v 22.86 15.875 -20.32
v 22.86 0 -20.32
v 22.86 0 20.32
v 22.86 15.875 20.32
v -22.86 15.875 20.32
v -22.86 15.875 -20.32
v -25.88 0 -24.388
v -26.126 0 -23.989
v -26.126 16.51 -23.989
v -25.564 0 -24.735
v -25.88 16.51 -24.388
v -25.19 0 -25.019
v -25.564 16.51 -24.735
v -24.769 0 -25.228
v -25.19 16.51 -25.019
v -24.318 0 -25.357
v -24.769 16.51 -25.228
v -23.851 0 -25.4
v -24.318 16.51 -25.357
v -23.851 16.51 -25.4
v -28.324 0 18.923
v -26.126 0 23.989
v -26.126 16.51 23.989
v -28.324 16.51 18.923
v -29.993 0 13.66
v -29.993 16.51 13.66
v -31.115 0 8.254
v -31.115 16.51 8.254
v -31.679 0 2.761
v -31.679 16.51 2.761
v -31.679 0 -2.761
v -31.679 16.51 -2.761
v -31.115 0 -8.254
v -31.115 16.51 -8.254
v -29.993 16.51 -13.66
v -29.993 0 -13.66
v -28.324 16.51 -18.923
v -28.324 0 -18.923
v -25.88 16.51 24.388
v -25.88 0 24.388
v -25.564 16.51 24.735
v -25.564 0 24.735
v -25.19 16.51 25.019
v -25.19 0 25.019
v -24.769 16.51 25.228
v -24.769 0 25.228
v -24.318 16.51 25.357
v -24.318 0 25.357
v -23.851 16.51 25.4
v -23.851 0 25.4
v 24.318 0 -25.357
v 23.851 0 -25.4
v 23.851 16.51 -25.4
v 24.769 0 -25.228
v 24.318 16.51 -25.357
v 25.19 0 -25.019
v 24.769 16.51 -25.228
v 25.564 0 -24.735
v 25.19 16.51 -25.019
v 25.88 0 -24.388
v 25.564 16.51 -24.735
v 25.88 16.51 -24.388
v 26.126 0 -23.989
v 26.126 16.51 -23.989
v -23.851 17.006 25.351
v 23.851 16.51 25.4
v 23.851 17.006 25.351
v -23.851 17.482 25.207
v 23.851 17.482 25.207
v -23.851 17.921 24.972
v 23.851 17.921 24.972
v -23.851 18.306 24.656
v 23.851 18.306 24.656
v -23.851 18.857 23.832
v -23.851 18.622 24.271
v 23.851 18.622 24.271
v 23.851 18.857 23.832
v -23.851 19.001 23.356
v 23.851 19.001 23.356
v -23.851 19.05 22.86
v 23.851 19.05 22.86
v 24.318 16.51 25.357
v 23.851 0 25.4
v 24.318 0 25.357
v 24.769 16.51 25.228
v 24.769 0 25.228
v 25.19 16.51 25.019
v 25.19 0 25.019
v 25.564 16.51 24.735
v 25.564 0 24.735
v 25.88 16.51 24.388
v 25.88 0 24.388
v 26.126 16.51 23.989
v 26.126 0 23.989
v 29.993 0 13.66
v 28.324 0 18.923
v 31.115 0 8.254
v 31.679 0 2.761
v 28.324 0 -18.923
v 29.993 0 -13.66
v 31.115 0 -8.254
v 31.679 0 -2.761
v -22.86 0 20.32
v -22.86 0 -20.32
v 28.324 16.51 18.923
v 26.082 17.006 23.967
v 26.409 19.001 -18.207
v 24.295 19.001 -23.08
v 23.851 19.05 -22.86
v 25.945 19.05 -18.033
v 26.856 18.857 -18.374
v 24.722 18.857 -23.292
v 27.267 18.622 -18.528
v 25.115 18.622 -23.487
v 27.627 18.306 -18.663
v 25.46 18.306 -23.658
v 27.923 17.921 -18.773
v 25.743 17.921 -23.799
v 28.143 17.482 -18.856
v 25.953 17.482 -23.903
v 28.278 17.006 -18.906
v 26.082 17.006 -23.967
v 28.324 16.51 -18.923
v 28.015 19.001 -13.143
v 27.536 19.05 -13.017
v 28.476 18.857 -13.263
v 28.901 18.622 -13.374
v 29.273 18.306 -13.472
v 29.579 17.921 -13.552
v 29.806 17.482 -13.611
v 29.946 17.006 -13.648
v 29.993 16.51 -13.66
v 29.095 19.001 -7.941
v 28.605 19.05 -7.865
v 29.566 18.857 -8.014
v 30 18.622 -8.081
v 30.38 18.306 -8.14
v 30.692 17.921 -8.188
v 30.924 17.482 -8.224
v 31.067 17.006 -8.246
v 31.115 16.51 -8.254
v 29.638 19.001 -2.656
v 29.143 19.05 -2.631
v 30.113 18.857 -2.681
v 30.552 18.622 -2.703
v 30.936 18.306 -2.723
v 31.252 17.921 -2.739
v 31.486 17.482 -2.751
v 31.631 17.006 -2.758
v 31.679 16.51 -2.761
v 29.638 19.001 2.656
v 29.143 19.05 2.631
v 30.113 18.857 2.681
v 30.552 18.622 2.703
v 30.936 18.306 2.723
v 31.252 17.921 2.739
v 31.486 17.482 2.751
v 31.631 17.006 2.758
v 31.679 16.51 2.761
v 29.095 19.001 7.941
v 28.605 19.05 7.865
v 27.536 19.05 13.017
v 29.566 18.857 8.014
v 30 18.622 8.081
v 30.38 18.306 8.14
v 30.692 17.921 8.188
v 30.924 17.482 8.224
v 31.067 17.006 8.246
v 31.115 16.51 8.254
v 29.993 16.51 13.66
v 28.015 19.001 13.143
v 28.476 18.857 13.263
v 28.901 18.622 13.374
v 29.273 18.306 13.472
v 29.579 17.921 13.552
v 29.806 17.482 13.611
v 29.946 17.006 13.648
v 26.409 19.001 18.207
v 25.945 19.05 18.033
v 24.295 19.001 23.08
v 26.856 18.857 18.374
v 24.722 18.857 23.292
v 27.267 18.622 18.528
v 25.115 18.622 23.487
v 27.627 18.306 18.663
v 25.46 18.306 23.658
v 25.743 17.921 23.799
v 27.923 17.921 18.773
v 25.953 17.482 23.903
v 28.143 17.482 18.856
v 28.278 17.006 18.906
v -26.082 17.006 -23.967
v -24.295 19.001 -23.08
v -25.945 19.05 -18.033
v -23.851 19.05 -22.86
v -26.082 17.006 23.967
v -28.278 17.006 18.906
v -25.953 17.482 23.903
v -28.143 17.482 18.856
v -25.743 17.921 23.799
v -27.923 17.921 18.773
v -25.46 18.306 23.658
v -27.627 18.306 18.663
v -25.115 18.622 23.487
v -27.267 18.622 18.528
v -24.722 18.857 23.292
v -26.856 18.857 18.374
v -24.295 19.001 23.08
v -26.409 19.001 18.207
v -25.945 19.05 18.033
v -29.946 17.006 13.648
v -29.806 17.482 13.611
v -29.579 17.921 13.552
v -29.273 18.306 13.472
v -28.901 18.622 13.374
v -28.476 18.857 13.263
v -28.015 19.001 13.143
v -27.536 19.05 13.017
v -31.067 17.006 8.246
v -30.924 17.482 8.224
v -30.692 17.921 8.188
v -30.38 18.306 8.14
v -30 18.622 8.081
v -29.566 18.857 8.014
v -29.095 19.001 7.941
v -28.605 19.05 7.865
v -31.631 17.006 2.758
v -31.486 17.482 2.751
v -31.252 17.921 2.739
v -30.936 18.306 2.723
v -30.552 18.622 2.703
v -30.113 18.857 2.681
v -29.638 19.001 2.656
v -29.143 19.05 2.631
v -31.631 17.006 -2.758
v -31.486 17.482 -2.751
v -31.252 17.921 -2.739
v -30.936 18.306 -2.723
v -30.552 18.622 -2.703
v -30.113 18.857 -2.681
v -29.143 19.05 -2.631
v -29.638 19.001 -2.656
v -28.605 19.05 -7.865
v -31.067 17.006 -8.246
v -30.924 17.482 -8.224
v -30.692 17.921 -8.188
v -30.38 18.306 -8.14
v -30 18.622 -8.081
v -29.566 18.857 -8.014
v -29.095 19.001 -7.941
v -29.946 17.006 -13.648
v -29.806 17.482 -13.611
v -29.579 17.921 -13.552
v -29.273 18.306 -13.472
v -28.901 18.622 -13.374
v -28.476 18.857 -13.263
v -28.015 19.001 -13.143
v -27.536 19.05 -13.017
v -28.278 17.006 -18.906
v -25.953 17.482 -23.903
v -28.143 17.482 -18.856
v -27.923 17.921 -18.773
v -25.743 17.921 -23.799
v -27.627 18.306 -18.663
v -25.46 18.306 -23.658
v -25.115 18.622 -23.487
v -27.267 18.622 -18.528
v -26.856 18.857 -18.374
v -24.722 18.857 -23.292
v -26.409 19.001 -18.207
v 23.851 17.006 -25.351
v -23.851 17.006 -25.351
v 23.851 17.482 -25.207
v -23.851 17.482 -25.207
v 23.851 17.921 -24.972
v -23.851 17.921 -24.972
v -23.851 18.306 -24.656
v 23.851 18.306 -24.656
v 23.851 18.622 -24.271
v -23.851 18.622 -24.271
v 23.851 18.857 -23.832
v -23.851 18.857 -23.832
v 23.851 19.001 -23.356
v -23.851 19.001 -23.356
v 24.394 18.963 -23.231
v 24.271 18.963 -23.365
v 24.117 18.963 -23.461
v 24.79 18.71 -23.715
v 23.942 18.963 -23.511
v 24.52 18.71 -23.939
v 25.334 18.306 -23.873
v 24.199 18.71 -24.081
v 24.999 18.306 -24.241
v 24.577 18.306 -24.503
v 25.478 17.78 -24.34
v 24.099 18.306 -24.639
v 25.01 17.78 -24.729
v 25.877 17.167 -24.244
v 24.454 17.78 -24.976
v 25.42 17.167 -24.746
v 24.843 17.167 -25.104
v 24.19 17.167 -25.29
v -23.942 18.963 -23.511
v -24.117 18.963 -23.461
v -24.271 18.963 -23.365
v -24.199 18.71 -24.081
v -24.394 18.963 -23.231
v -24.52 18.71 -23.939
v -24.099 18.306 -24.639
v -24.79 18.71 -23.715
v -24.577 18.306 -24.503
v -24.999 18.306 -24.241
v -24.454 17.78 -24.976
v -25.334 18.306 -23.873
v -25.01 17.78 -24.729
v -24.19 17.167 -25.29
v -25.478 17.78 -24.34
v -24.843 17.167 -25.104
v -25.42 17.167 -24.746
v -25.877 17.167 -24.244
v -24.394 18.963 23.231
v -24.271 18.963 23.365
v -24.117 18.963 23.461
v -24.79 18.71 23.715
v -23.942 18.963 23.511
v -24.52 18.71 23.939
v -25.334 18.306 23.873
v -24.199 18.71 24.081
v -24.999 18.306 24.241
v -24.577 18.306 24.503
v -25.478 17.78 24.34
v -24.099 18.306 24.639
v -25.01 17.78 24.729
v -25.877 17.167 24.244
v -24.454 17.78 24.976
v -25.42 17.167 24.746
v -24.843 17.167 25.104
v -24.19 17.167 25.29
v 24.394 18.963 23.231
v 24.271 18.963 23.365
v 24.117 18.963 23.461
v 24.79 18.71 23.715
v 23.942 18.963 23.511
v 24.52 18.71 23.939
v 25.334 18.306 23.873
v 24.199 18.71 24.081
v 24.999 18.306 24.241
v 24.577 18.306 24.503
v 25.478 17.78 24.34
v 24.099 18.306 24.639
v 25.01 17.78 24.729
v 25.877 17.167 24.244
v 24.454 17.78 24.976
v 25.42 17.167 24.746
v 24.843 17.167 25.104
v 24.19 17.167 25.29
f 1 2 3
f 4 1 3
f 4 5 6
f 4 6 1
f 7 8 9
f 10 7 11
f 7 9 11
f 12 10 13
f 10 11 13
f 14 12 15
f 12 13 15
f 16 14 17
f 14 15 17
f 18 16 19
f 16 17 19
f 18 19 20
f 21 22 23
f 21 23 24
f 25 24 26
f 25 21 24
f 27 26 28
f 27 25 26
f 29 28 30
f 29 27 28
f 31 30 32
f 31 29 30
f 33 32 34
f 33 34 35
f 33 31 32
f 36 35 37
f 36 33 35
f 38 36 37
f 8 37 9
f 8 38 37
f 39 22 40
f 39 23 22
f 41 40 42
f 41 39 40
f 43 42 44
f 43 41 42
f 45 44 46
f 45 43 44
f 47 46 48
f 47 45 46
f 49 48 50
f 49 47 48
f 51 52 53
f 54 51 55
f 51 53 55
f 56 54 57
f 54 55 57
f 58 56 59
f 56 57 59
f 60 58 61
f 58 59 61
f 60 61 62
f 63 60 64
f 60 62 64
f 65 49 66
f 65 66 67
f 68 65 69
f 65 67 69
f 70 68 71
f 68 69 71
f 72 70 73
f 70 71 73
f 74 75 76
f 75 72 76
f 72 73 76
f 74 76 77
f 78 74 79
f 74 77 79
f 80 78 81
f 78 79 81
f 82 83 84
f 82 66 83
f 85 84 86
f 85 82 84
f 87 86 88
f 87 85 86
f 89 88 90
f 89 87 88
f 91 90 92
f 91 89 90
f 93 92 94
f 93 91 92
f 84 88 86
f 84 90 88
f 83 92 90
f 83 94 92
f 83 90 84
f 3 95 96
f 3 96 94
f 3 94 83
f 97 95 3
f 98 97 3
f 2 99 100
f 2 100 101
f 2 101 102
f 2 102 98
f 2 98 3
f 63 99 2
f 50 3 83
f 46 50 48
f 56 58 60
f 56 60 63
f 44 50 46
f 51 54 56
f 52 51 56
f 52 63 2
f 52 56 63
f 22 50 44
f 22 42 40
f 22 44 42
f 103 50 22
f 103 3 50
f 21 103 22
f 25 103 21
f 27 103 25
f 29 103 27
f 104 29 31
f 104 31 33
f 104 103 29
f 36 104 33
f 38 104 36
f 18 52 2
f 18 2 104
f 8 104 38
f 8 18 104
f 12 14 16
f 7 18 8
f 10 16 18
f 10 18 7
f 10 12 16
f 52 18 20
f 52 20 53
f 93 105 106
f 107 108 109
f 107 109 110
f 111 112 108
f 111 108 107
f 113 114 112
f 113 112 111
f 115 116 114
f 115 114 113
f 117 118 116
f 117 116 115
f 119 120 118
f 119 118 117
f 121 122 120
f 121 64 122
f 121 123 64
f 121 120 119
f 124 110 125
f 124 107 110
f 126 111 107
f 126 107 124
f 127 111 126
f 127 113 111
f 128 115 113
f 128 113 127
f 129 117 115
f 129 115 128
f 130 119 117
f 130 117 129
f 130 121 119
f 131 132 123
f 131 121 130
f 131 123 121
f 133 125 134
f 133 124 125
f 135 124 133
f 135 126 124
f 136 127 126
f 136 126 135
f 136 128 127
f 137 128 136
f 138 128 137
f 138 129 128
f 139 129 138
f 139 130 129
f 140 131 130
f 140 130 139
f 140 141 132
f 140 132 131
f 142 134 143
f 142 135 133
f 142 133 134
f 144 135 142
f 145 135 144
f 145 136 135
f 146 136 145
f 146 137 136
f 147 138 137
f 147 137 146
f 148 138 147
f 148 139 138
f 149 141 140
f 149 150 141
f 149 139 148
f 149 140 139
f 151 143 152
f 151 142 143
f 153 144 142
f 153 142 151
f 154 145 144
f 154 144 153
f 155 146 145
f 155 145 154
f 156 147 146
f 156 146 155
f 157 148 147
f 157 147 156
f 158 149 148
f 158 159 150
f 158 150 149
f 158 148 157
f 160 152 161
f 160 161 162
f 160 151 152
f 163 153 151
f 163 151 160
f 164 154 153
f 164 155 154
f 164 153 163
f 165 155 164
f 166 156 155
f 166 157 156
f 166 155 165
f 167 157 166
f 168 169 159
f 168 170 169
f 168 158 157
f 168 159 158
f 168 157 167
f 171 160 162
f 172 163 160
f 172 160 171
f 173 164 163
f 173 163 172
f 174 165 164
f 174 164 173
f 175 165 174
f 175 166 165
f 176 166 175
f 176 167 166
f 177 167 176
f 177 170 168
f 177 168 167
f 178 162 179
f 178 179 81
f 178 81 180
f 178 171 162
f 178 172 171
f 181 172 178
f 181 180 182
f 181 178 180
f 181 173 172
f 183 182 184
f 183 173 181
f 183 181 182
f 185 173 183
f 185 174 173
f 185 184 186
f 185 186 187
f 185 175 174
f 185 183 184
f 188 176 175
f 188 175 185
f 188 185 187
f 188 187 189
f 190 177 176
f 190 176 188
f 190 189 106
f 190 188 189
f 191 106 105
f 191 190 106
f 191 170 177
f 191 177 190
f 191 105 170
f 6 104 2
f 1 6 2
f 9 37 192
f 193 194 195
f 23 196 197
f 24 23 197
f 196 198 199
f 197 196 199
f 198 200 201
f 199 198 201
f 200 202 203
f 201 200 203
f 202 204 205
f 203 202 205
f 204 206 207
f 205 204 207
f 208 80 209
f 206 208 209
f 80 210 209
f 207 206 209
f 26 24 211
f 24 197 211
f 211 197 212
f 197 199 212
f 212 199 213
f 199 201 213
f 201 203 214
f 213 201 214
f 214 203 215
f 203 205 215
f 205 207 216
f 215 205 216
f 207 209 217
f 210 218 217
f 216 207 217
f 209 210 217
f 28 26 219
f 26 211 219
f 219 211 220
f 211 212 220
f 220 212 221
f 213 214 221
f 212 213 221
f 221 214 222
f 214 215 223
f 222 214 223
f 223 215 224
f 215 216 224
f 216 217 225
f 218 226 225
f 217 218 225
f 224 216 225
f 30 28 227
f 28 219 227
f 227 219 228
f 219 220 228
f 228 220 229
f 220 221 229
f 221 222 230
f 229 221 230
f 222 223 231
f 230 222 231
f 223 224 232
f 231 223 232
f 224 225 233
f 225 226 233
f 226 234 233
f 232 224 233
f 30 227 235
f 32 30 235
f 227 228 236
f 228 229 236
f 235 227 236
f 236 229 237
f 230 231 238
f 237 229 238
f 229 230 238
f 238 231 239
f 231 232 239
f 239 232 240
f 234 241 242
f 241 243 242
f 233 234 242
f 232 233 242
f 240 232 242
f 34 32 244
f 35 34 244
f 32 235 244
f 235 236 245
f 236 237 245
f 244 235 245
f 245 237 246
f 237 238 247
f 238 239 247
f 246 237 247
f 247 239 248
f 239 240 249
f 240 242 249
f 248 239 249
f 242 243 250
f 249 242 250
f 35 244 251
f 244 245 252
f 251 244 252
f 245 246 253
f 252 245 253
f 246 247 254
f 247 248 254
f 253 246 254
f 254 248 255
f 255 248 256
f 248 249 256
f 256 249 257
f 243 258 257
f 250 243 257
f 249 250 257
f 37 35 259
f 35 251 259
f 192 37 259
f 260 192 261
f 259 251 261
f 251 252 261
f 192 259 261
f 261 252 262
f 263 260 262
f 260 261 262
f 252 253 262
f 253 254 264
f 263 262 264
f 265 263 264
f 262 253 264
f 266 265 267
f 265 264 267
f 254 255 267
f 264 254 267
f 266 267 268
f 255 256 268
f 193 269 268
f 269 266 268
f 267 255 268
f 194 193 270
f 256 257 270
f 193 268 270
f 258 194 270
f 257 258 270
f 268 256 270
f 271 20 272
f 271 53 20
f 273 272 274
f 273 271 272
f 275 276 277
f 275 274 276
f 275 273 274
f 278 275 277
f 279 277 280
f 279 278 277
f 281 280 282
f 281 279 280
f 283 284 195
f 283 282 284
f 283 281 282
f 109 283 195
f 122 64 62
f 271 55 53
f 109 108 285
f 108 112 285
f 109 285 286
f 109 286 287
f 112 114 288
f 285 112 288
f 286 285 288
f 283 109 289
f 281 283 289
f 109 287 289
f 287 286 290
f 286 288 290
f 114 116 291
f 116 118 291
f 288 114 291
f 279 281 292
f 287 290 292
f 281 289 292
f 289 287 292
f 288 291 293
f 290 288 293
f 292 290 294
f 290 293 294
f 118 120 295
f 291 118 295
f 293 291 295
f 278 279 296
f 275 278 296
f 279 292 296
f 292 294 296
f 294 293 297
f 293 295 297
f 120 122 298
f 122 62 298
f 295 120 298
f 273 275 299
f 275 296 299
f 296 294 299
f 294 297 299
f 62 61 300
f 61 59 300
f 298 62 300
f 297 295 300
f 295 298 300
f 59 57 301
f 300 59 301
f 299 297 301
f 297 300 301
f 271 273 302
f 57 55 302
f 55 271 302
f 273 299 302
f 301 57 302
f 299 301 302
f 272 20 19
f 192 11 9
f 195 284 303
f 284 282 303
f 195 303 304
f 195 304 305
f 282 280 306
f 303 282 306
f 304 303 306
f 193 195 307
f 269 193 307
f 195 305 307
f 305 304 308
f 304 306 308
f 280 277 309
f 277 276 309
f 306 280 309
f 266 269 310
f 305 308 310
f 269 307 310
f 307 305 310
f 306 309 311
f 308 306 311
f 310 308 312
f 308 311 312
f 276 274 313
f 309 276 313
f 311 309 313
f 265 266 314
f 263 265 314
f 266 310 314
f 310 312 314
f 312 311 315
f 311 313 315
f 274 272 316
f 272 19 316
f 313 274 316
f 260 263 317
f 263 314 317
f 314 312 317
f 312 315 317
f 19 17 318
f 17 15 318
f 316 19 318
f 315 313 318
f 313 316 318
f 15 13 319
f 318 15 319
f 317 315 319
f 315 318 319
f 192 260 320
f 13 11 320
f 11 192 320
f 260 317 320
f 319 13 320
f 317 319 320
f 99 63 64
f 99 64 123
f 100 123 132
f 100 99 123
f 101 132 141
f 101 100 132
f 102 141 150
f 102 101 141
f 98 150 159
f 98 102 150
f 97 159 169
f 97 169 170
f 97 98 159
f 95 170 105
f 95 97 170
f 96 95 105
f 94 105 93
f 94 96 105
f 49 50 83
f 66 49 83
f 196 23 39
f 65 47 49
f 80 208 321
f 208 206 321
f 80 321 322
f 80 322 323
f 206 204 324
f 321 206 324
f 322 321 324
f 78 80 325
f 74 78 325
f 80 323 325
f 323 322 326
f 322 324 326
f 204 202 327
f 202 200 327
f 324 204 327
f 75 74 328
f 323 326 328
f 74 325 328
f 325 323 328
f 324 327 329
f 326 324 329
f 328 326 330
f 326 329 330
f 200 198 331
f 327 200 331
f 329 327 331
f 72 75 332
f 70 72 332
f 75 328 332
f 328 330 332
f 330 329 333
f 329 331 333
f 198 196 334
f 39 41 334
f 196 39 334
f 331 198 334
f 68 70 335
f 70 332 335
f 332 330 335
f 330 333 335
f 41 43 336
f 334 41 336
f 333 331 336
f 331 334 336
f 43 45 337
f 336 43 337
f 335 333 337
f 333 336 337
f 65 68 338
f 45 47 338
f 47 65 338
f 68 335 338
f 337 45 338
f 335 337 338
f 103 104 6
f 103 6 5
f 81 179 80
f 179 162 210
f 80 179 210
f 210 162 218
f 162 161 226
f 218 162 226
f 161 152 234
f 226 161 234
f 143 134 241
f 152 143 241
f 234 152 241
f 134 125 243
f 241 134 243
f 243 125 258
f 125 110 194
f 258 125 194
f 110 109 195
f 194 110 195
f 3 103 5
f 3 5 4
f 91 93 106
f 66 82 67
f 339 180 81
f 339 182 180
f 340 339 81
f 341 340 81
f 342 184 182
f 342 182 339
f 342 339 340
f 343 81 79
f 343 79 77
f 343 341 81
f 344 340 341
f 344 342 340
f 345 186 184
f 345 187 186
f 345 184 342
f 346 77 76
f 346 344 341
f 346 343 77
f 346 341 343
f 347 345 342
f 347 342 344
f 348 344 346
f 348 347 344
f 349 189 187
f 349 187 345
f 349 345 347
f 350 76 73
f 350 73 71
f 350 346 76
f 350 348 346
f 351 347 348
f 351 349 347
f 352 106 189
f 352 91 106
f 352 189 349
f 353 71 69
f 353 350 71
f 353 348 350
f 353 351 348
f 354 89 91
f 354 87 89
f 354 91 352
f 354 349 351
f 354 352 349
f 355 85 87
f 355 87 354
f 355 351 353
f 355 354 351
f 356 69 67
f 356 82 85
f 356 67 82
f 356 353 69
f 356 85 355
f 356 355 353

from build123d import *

# Parameters (mm, degrees)
SKETCH1_W           = 50.8
SKETCH1_H           = 50.8
BOSS_EXTRUDE1_DEPTH = 19.05
SKETCH2_W           = 45.72
SKETCH2_H           = 40.64
CUT_EXTRUDE1_DEPTH  = 15.875
FILLET1_R           = 2.54


with BuildPart() as part:
    # Sketch1 → Boss-Extrude1 (new body)
    with BuildSketch(Plane(origin=(0, 0, 0), x_dir=(1, 0, 0), z_dir=(0, 1, 0))):
        with BuildLine():
            ThreePointArc((-25.4, -25.4), (-31.75, 0), (-25.4, 25.4))
            Line((-25.4, 25.4), (-25.4, -25.4))
        make_face()
        with BuildLine():
            ThreePointArc((25.4, 25.4), (31.75, 0), (25.4, -25.4))
            Line((25.4, -25.4), (25.4, 25.4))
        make_face()
        Rectangle(SKETCH1_W, SKETCH1_H)
    extrude(amount=BOSS_EXTRUDE1_DEPTH)

    # Sketch2 → Cut-Extrude1 (cut)
    with BuildSketch(Plane.XZ):
        Rectangle(SKETCH2_W, SKETCH2_H)
    extrude(amount=-CUT_EXTRUDE1_DEPTH, mode=Mode.SUBTRACT)

    # Fillet1
    fillet1_edges = [part.edges().sort_by_distance(p)[0] for p in [
        (31.75, 19.05, 0),
        (0, 19.05, -25.4),
        (-31.75, 19.05, 0),
        (0, 19.05, 25.4),
        (-25.4, 9.525, -25.4),
        (25.4, 9.525, -25.4),
        (25.4, 9.525, 25.4),
        (-25.4, 9.525, 25.4),
    ]]
    fillet(fillet1_edges, radius=FILLET1_R)


solid = part.part
